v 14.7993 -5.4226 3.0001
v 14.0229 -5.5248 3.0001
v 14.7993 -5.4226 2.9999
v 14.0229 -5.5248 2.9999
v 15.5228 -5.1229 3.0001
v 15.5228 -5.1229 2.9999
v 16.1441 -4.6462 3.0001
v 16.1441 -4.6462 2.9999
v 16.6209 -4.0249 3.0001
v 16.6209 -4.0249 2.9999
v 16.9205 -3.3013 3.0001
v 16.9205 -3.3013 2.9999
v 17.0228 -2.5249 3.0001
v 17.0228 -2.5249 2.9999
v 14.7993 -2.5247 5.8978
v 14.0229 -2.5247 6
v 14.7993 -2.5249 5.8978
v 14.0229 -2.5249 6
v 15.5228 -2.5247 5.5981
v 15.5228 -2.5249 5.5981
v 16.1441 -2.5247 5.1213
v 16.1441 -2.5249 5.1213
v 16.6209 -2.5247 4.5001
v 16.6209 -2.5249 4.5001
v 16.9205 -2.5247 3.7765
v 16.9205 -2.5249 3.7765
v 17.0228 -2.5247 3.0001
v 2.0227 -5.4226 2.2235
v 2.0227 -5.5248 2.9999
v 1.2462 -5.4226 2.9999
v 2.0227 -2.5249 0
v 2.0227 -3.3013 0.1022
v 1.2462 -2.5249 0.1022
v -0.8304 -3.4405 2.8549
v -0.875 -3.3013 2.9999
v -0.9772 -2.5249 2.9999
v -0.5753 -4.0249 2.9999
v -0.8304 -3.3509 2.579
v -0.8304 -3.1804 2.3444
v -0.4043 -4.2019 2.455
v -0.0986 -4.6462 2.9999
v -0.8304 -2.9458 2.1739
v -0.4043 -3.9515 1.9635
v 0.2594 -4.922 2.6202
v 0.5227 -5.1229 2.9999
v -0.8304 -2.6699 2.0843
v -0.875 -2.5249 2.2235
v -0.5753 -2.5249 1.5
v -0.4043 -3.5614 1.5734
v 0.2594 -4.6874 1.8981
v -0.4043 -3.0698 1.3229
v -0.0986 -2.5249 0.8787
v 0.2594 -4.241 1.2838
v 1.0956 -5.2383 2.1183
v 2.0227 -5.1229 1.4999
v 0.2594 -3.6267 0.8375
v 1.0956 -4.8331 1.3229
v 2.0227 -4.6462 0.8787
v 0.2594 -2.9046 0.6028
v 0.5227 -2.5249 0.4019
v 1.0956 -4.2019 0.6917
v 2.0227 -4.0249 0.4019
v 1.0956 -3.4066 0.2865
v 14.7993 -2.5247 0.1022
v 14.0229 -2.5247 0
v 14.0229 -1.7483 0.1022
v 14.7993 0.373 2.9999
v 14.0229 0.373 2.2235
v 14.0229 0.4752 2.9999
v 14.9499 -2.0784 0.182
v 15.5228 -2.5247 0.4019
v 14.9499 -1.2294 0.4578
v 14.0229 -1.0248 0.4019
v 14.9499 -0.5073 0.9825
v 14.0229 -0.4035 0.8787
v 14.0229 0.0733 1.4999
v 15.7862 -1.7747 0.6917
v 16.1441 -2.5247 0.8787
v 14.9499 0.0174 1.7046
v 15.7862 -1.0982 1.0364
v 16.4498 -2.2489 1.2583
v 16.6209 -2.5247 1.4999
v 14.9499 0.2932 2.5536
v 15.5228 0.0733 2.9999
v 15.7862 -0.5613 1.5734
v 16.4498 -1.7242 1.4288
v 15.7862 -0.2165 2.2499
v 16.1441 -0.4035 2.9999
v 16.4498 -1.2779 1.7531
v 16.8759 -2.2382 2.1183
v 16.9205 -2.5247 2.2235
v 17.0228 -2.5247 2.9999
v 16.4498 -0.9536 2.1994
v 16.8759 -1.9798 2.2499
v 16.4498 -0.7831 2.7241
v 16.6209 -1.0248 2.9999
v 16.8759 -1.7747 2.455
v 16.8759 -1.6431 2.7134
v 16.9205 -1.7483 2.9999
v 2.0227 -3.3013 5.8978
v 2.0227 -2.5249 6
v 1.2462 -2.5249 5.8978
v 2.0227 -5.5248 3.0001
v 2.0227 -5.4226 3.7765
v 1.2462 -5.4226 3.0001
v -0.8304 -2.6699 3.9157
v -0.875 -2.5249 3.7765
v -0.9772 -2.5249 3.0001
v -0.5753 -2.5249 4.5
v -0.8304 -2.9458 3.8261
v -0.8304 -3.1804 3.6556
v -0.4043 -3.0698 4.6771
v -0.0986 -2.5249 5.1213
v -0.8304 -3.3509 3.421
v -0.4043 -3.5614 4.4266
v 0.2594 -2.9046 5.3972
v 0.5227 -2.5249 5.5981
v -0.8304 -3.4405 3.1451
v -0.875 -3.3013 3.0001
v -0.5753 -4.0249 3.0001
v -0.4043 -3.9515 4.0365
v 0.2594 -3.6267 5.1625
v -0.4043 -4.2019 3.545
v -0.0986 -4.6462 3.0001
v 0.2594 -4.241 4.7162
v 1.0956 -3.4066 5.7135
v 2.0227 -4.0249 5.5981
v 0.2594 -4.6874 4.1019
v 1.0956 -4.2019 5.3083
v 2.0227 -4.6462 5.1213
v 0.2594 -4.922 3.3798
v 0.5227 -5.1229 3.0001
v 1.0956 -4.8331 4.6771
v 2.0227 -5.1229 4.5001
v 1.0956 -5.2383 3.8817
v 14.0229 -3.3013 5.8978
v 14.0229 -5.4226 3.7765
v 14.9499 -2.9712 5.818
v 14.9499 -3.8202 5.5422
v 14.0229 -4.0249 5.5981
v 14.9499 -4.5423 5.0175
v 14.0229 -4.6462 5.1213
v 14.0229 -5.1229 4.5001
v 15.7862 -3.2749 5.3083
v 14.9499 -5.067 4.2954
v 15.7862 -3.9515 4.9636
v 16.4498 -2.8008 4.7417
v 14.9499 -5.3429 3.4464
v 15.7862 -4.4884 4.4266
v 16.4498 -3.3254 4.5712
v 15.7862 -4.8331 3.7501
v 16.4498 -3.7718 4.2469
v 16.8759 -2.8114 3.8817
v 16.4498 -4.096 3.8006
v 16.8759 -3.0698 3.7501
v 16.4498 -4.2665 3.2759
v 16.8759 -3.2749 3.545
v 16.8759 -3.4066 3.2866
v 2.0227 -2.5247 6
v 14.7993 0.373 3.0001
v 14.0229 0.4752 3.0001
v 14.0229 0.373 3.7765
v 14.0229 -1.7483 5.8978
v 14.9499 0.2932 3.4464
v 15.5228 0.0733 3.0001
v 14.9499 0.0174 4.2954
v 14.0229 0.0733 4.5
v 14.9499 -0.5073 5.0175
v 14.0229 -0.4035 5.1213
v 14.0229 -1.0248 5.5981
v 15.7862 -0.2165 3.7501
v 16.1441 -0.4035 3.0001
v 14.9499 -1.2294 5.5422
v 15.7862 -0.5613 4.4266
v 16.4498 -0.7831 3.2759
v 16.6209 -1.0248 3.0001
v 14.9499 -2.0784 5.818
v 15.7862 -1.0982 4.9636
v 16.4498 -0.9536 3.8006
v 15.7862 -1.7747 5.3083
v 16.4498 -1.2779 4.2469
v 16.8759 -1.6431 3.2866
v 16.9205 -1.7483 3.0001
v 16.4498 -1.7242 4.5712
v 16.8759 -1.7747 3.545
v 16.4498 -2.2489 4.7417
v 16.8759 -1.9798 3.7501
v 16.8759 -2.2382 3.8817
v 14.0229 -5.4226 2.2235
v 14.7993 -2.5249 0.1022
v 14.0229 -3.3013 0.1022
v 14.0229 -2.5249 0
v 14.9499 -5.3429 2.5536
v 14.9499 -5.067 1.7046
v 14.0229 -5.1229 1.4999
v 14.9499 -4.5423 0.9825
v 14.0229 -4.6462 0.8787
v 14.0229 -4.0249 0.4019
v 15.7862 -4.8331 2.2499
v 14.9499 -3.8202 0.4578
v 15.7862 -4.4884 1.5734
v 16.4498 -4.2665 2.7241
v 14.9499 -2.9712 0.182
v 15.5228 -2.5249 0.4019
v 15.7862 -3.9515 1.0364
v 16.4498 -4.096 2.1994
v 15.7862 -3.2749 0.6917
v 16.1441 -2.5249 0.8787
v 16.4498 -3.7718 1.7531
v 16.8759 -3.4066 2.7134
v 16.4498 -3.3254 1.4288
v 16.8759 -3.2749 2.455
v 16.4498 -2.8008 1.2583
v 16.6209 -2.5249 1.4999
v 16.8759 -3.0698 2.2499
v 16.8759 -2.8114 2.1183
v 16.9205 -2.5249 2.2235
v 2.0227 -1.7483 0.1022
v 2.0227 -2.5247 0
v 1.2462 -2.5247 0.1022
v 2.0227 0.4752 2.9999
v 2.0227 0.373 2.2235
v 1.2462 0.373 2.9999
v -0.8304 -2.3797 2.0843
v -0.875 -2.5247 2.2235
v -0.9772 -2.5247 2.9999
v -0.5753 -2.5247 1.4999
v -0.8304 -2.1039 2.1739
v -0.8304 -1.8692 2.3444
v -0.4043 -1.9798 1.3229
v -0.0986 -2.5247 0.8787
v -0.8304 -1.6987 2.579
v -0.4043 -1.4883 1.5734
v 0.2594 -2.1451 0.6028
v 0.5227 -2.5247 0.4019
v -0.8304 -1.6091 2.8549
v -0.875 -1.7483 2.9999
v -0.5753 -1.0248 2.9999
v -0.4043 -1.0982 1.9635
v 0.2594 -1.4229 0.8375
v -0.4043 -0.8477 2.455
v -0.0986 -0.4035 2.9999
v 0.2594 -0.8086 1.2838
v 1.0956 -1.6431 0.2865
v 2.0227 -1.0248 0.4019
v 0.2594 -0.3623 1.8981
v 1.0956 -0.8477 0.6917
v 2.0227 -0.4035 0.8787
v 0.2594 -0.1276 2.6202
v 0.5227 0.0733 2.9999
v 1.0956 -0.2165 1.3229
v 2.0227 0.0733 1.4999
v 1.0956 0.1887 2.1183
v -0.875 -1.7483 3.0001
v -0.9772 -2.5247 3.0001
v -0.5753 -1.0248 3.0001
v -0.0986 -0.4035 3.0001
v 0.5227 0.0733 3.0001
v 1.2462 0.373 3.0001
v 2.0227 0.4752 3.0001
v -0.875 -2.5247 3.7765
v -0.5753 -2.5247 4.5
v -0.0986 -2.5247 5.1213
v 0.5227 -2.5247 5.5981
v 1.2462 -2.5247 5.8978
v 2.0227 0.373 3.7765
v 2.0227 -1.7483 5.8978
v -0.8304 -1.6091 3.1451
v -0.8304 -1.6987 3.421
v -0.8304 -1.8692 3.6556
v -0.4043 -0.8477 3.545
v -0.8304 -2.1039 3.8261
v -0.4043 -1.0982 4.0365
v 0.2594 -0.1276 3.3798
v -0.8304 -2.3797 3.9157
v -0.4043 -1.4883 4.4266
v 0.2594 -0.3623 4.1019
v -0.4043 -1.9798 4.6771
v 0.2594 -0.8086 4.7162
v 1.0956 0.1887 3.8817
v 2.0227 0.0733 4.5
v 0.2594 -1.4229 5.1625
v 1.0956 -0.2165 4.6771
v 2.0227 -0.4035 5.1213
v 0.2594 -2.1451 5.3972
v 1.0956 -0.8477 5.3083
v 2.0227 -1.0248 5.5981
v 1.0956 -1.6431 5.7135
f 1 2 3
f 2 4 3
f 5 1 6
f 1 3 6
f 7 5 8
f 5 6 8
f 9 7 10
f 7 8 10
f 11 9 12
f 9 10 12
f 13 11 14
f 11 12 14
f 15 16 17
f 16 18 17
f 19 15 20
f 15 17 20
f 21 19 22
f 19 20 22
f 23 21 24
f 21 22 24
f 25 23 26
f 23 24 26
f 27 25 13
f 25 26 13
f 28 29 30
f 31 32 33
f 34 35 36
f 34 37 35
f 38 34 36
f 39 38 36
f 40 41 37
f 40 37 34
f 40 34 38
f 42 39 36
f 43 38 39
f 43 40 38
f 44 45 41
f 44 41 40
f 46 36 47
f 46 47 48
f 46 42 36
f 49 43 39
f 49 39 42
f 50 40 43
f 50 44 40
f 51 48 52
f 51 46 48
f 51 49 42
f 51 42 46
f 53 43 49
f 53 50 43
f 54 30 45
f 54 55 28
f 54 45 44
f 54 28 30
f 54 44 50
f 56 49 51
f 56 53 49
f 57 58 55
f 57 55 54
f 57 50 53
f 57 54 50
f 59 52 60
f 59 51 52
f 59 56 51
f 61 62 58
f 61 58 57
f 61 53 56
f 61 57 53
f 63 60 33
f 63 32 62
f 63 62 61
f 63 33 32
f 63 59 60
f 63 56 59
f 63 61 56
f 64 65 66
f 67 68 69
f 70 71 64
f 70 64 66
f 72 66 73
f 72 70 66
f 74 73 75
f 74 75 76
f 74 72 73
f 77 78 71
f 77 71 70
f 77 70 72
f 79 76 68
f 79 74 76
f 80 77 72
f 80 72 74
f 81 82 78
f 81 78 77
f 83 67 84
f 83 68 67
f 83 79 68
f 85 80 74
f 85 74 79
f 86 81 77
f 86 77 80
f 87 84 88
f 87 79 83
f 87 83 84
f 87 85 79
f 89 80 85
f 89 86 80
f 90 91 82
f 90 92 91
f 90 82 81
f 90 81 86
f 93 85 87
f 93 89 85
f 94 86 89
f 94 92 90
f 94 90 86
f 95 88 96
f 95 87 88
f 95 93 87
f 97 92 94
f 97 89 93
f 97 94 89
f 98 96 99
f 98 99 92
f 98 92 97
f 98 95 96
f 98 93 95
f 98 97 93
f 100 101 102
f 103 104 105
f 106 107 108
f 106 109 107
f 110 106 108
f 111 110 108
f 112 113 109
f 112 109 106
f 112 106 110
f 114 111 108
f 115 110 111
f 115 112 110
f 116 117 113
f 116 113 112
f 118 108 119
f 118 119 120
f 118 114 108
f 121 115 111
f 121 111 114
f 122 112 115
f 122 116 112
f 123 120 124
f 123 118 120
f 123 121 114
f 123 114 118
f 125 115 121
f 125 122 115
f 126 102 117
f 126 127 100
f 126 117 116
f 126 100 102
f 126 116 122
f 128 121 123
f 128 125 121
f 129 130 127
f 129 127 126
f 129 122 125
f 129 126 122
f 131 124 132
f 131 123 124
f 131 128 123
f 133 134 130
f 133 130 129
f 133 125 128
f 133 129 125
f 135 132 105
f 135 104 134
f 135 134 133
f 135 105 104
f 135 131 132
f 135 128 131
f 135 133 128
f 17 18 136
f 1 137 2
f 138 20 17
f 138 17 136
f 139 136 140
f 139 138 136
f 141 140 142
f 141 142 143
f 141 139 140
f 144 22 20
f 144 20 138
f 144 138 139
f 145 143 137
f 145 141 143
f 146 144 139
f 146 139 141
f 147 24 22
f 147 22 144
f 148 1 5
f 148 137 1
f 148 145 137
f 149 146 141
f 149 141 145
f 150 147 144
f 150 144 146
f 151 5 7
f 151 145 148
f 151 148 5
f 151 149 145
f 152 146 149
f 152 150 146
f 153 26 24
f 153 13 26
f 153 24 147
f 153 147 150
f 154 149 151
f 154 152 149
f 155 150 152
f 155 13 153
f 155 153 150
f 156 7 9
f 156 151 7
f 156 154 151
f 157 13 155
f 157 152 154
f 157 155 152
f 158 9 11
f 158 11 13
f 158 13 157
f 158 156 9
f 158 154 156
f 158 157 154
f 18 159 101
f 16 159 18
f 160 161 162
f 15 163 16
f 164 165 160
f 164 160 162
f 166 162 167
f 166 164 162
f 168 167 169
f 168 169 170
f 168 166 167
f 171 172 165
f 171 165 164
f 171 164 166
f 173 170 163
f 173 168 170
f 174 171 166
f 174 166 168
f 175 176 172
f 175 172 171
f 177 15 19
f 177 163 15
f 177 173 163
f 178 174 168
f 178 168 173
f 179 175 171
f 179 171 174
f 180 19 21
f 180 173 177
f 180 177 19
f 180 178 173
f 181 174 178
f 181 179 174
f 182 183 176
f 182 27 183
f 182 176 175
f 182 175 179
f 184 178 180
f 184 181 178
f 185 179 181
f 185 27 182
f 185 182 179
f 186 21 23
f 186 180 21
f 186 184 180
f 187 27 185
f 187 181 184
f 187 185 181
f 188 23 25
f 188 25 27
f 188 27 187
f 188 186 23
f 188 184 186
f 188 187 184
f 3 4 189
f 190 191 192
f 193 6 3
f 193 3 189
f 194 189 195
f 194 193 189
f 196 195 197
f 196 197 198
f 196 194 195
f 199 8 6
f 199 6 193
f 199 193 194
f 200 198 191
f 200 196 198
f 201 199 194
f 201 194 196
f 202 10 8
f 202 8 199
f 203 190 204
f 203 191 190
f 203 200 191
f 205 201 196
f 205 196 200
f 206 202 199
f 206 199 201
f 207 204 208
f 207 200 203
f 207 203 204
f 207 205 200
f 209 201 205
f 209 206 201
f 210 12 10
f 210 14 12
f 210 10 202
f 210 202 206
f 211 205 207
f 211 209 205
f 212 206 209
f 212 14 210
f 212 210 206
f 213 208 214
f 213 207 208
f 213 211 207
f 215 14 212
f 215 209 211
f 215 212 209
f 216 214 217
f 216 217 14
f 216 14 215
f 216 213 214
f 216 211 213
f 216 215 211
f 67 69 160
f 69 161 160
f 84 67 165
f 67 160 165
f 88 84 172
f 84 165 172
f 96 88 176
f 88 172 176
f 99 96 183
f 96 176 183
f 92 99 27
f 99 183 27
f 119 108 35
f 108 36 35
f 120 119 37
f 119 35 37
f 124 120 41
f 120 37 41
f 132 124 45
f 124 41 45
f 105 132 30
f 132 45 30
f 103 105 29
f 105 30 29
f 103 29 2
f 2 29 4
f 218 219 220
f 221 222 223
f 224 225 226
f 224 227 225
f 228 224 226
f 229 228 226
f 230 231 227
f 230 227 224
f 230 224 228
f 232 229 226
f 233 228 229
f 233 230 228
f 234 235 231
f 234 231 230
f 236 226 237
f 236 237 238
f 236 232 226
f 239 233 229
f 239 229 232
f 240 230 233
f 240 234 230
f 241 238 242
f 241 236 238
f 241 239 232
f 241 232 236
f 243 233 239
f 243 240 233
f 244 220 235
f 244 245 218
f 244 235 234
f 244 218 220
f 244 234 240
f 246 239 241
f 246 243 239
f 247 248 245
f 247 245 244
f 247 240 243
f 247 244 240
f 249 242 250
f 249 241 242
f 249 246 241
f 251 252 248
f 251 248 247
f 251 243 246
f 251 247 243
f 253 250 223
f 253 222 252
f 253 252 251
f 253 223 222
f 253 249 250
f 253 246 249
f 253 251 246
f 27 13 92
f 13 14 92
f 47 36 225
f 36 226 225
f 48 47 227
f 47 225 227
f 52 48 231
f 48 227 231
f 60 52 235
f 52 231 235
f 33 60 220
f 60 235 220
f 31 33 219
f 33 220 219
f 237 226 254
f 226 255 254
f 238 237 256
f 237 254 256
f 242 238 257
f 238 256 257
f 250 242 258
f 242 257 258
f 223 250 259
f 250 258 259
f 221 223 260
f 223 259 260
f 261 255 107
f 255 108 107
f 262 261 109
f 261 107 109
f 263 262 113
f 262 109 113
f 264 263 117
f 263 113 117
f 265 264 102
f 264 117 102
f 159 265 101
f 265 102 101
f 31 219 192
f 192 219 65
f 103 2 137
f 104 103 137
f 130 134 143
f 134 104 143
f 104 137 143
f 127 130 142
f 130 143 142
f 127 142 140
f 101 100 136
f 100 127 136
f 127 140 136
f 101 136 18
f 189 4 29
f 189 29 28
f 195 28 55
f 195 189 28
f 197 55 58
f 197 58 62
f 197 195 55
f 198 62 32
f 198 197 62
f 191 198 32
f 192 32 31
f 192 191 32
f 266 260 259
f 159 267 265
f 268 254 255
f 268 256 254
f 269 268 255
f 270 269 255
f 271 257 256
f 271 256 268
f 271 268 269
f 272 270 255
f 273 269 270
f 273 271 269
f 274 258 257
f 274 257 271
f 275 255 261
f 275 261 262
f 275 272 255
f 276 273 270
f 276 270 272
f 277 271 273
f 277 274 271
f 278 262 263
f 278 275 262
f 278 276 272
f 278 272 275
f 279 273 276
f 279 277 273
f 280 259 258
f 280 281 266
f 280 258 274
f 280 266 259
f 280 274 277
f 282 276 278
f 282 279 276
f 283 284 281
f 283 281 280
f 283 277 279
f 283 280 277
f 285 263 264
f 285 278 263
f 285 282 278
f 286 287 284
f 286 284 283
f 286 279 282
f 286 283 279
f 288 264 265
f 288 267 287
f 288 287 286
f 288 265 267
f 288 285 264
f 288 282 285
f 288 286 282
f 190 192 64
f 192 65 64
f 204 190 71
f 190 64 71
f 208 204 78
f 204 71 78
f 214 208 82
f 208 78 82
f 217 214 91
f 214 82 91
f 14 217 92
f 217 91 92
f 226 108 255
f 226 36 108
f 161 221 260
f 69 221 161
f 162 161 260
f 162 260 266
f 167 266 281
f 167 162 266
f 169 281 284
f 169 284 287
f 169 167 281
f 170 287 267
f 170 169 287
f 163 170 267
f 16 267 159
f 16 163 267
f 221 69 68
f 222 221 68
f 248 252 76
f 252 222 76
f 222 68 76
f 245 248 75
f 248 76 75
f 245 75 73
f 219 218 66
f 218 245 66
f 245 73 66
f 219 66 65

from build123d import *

# Parameters (mm, degrees)
SKETCH1_W           = 18
SKETCH1_H           = 6
BOSS_EXTRUDE1_DEPTH = 6
FILLET1_R           = 3
FILLET2_R           = 3


with BuildPart() as part:
    # Sketch1 → Boss-Extrude1 (new body)
    with BuildSketch(Plane.XY):
        with Locations((8.022761194, -2.524813433)):
            Rectangle(SKETCH1_W, SKETCH1_H)
    extrude(amount=BOSS_EXTRUDE1_DEPTH)

    # Fillet1
    fillet1_edges = [part.edges().sort_by_distance(p)[0] for p in [
        (8.022761194, -5.524813433, 6),
        (8.022761194, -5.524813433, 0),
        (8.022761194, 0.475186567, 0),
        (8.022761194, 0.475186567, 6),
    ]]
    fillet(fillet1_edges, radius=FILLET1_R - 0.0001)  # a hair under: the kernel refuses the full size

    # Fillet2
    fillet2_edges = [part.edges().sort_by_distance(p)[0] for p in [
        (17.022761194, -0.4034638, 5.121349633),
        (17.022761194, -0.4034638, 0.878650367),
        (17.022761194, -4.646163066, 0.878650367),
        (17.022761194, -4.646163066, 5.121349633),
        (-0.977238806, -0.4034638, 5.121349633),
        (-0.977238806, -0.4034638, 0.878650367),
        (-0.977238806, -4.646163066, 0.878650367),
        (-0.977238806, -4.646163066, 5.121349633),
    ]]
    fillet(fillet2_edges, radius=FILLET2_R - 0.0001)  # a hair under: the kernel refuses the full size


solid = part.part
